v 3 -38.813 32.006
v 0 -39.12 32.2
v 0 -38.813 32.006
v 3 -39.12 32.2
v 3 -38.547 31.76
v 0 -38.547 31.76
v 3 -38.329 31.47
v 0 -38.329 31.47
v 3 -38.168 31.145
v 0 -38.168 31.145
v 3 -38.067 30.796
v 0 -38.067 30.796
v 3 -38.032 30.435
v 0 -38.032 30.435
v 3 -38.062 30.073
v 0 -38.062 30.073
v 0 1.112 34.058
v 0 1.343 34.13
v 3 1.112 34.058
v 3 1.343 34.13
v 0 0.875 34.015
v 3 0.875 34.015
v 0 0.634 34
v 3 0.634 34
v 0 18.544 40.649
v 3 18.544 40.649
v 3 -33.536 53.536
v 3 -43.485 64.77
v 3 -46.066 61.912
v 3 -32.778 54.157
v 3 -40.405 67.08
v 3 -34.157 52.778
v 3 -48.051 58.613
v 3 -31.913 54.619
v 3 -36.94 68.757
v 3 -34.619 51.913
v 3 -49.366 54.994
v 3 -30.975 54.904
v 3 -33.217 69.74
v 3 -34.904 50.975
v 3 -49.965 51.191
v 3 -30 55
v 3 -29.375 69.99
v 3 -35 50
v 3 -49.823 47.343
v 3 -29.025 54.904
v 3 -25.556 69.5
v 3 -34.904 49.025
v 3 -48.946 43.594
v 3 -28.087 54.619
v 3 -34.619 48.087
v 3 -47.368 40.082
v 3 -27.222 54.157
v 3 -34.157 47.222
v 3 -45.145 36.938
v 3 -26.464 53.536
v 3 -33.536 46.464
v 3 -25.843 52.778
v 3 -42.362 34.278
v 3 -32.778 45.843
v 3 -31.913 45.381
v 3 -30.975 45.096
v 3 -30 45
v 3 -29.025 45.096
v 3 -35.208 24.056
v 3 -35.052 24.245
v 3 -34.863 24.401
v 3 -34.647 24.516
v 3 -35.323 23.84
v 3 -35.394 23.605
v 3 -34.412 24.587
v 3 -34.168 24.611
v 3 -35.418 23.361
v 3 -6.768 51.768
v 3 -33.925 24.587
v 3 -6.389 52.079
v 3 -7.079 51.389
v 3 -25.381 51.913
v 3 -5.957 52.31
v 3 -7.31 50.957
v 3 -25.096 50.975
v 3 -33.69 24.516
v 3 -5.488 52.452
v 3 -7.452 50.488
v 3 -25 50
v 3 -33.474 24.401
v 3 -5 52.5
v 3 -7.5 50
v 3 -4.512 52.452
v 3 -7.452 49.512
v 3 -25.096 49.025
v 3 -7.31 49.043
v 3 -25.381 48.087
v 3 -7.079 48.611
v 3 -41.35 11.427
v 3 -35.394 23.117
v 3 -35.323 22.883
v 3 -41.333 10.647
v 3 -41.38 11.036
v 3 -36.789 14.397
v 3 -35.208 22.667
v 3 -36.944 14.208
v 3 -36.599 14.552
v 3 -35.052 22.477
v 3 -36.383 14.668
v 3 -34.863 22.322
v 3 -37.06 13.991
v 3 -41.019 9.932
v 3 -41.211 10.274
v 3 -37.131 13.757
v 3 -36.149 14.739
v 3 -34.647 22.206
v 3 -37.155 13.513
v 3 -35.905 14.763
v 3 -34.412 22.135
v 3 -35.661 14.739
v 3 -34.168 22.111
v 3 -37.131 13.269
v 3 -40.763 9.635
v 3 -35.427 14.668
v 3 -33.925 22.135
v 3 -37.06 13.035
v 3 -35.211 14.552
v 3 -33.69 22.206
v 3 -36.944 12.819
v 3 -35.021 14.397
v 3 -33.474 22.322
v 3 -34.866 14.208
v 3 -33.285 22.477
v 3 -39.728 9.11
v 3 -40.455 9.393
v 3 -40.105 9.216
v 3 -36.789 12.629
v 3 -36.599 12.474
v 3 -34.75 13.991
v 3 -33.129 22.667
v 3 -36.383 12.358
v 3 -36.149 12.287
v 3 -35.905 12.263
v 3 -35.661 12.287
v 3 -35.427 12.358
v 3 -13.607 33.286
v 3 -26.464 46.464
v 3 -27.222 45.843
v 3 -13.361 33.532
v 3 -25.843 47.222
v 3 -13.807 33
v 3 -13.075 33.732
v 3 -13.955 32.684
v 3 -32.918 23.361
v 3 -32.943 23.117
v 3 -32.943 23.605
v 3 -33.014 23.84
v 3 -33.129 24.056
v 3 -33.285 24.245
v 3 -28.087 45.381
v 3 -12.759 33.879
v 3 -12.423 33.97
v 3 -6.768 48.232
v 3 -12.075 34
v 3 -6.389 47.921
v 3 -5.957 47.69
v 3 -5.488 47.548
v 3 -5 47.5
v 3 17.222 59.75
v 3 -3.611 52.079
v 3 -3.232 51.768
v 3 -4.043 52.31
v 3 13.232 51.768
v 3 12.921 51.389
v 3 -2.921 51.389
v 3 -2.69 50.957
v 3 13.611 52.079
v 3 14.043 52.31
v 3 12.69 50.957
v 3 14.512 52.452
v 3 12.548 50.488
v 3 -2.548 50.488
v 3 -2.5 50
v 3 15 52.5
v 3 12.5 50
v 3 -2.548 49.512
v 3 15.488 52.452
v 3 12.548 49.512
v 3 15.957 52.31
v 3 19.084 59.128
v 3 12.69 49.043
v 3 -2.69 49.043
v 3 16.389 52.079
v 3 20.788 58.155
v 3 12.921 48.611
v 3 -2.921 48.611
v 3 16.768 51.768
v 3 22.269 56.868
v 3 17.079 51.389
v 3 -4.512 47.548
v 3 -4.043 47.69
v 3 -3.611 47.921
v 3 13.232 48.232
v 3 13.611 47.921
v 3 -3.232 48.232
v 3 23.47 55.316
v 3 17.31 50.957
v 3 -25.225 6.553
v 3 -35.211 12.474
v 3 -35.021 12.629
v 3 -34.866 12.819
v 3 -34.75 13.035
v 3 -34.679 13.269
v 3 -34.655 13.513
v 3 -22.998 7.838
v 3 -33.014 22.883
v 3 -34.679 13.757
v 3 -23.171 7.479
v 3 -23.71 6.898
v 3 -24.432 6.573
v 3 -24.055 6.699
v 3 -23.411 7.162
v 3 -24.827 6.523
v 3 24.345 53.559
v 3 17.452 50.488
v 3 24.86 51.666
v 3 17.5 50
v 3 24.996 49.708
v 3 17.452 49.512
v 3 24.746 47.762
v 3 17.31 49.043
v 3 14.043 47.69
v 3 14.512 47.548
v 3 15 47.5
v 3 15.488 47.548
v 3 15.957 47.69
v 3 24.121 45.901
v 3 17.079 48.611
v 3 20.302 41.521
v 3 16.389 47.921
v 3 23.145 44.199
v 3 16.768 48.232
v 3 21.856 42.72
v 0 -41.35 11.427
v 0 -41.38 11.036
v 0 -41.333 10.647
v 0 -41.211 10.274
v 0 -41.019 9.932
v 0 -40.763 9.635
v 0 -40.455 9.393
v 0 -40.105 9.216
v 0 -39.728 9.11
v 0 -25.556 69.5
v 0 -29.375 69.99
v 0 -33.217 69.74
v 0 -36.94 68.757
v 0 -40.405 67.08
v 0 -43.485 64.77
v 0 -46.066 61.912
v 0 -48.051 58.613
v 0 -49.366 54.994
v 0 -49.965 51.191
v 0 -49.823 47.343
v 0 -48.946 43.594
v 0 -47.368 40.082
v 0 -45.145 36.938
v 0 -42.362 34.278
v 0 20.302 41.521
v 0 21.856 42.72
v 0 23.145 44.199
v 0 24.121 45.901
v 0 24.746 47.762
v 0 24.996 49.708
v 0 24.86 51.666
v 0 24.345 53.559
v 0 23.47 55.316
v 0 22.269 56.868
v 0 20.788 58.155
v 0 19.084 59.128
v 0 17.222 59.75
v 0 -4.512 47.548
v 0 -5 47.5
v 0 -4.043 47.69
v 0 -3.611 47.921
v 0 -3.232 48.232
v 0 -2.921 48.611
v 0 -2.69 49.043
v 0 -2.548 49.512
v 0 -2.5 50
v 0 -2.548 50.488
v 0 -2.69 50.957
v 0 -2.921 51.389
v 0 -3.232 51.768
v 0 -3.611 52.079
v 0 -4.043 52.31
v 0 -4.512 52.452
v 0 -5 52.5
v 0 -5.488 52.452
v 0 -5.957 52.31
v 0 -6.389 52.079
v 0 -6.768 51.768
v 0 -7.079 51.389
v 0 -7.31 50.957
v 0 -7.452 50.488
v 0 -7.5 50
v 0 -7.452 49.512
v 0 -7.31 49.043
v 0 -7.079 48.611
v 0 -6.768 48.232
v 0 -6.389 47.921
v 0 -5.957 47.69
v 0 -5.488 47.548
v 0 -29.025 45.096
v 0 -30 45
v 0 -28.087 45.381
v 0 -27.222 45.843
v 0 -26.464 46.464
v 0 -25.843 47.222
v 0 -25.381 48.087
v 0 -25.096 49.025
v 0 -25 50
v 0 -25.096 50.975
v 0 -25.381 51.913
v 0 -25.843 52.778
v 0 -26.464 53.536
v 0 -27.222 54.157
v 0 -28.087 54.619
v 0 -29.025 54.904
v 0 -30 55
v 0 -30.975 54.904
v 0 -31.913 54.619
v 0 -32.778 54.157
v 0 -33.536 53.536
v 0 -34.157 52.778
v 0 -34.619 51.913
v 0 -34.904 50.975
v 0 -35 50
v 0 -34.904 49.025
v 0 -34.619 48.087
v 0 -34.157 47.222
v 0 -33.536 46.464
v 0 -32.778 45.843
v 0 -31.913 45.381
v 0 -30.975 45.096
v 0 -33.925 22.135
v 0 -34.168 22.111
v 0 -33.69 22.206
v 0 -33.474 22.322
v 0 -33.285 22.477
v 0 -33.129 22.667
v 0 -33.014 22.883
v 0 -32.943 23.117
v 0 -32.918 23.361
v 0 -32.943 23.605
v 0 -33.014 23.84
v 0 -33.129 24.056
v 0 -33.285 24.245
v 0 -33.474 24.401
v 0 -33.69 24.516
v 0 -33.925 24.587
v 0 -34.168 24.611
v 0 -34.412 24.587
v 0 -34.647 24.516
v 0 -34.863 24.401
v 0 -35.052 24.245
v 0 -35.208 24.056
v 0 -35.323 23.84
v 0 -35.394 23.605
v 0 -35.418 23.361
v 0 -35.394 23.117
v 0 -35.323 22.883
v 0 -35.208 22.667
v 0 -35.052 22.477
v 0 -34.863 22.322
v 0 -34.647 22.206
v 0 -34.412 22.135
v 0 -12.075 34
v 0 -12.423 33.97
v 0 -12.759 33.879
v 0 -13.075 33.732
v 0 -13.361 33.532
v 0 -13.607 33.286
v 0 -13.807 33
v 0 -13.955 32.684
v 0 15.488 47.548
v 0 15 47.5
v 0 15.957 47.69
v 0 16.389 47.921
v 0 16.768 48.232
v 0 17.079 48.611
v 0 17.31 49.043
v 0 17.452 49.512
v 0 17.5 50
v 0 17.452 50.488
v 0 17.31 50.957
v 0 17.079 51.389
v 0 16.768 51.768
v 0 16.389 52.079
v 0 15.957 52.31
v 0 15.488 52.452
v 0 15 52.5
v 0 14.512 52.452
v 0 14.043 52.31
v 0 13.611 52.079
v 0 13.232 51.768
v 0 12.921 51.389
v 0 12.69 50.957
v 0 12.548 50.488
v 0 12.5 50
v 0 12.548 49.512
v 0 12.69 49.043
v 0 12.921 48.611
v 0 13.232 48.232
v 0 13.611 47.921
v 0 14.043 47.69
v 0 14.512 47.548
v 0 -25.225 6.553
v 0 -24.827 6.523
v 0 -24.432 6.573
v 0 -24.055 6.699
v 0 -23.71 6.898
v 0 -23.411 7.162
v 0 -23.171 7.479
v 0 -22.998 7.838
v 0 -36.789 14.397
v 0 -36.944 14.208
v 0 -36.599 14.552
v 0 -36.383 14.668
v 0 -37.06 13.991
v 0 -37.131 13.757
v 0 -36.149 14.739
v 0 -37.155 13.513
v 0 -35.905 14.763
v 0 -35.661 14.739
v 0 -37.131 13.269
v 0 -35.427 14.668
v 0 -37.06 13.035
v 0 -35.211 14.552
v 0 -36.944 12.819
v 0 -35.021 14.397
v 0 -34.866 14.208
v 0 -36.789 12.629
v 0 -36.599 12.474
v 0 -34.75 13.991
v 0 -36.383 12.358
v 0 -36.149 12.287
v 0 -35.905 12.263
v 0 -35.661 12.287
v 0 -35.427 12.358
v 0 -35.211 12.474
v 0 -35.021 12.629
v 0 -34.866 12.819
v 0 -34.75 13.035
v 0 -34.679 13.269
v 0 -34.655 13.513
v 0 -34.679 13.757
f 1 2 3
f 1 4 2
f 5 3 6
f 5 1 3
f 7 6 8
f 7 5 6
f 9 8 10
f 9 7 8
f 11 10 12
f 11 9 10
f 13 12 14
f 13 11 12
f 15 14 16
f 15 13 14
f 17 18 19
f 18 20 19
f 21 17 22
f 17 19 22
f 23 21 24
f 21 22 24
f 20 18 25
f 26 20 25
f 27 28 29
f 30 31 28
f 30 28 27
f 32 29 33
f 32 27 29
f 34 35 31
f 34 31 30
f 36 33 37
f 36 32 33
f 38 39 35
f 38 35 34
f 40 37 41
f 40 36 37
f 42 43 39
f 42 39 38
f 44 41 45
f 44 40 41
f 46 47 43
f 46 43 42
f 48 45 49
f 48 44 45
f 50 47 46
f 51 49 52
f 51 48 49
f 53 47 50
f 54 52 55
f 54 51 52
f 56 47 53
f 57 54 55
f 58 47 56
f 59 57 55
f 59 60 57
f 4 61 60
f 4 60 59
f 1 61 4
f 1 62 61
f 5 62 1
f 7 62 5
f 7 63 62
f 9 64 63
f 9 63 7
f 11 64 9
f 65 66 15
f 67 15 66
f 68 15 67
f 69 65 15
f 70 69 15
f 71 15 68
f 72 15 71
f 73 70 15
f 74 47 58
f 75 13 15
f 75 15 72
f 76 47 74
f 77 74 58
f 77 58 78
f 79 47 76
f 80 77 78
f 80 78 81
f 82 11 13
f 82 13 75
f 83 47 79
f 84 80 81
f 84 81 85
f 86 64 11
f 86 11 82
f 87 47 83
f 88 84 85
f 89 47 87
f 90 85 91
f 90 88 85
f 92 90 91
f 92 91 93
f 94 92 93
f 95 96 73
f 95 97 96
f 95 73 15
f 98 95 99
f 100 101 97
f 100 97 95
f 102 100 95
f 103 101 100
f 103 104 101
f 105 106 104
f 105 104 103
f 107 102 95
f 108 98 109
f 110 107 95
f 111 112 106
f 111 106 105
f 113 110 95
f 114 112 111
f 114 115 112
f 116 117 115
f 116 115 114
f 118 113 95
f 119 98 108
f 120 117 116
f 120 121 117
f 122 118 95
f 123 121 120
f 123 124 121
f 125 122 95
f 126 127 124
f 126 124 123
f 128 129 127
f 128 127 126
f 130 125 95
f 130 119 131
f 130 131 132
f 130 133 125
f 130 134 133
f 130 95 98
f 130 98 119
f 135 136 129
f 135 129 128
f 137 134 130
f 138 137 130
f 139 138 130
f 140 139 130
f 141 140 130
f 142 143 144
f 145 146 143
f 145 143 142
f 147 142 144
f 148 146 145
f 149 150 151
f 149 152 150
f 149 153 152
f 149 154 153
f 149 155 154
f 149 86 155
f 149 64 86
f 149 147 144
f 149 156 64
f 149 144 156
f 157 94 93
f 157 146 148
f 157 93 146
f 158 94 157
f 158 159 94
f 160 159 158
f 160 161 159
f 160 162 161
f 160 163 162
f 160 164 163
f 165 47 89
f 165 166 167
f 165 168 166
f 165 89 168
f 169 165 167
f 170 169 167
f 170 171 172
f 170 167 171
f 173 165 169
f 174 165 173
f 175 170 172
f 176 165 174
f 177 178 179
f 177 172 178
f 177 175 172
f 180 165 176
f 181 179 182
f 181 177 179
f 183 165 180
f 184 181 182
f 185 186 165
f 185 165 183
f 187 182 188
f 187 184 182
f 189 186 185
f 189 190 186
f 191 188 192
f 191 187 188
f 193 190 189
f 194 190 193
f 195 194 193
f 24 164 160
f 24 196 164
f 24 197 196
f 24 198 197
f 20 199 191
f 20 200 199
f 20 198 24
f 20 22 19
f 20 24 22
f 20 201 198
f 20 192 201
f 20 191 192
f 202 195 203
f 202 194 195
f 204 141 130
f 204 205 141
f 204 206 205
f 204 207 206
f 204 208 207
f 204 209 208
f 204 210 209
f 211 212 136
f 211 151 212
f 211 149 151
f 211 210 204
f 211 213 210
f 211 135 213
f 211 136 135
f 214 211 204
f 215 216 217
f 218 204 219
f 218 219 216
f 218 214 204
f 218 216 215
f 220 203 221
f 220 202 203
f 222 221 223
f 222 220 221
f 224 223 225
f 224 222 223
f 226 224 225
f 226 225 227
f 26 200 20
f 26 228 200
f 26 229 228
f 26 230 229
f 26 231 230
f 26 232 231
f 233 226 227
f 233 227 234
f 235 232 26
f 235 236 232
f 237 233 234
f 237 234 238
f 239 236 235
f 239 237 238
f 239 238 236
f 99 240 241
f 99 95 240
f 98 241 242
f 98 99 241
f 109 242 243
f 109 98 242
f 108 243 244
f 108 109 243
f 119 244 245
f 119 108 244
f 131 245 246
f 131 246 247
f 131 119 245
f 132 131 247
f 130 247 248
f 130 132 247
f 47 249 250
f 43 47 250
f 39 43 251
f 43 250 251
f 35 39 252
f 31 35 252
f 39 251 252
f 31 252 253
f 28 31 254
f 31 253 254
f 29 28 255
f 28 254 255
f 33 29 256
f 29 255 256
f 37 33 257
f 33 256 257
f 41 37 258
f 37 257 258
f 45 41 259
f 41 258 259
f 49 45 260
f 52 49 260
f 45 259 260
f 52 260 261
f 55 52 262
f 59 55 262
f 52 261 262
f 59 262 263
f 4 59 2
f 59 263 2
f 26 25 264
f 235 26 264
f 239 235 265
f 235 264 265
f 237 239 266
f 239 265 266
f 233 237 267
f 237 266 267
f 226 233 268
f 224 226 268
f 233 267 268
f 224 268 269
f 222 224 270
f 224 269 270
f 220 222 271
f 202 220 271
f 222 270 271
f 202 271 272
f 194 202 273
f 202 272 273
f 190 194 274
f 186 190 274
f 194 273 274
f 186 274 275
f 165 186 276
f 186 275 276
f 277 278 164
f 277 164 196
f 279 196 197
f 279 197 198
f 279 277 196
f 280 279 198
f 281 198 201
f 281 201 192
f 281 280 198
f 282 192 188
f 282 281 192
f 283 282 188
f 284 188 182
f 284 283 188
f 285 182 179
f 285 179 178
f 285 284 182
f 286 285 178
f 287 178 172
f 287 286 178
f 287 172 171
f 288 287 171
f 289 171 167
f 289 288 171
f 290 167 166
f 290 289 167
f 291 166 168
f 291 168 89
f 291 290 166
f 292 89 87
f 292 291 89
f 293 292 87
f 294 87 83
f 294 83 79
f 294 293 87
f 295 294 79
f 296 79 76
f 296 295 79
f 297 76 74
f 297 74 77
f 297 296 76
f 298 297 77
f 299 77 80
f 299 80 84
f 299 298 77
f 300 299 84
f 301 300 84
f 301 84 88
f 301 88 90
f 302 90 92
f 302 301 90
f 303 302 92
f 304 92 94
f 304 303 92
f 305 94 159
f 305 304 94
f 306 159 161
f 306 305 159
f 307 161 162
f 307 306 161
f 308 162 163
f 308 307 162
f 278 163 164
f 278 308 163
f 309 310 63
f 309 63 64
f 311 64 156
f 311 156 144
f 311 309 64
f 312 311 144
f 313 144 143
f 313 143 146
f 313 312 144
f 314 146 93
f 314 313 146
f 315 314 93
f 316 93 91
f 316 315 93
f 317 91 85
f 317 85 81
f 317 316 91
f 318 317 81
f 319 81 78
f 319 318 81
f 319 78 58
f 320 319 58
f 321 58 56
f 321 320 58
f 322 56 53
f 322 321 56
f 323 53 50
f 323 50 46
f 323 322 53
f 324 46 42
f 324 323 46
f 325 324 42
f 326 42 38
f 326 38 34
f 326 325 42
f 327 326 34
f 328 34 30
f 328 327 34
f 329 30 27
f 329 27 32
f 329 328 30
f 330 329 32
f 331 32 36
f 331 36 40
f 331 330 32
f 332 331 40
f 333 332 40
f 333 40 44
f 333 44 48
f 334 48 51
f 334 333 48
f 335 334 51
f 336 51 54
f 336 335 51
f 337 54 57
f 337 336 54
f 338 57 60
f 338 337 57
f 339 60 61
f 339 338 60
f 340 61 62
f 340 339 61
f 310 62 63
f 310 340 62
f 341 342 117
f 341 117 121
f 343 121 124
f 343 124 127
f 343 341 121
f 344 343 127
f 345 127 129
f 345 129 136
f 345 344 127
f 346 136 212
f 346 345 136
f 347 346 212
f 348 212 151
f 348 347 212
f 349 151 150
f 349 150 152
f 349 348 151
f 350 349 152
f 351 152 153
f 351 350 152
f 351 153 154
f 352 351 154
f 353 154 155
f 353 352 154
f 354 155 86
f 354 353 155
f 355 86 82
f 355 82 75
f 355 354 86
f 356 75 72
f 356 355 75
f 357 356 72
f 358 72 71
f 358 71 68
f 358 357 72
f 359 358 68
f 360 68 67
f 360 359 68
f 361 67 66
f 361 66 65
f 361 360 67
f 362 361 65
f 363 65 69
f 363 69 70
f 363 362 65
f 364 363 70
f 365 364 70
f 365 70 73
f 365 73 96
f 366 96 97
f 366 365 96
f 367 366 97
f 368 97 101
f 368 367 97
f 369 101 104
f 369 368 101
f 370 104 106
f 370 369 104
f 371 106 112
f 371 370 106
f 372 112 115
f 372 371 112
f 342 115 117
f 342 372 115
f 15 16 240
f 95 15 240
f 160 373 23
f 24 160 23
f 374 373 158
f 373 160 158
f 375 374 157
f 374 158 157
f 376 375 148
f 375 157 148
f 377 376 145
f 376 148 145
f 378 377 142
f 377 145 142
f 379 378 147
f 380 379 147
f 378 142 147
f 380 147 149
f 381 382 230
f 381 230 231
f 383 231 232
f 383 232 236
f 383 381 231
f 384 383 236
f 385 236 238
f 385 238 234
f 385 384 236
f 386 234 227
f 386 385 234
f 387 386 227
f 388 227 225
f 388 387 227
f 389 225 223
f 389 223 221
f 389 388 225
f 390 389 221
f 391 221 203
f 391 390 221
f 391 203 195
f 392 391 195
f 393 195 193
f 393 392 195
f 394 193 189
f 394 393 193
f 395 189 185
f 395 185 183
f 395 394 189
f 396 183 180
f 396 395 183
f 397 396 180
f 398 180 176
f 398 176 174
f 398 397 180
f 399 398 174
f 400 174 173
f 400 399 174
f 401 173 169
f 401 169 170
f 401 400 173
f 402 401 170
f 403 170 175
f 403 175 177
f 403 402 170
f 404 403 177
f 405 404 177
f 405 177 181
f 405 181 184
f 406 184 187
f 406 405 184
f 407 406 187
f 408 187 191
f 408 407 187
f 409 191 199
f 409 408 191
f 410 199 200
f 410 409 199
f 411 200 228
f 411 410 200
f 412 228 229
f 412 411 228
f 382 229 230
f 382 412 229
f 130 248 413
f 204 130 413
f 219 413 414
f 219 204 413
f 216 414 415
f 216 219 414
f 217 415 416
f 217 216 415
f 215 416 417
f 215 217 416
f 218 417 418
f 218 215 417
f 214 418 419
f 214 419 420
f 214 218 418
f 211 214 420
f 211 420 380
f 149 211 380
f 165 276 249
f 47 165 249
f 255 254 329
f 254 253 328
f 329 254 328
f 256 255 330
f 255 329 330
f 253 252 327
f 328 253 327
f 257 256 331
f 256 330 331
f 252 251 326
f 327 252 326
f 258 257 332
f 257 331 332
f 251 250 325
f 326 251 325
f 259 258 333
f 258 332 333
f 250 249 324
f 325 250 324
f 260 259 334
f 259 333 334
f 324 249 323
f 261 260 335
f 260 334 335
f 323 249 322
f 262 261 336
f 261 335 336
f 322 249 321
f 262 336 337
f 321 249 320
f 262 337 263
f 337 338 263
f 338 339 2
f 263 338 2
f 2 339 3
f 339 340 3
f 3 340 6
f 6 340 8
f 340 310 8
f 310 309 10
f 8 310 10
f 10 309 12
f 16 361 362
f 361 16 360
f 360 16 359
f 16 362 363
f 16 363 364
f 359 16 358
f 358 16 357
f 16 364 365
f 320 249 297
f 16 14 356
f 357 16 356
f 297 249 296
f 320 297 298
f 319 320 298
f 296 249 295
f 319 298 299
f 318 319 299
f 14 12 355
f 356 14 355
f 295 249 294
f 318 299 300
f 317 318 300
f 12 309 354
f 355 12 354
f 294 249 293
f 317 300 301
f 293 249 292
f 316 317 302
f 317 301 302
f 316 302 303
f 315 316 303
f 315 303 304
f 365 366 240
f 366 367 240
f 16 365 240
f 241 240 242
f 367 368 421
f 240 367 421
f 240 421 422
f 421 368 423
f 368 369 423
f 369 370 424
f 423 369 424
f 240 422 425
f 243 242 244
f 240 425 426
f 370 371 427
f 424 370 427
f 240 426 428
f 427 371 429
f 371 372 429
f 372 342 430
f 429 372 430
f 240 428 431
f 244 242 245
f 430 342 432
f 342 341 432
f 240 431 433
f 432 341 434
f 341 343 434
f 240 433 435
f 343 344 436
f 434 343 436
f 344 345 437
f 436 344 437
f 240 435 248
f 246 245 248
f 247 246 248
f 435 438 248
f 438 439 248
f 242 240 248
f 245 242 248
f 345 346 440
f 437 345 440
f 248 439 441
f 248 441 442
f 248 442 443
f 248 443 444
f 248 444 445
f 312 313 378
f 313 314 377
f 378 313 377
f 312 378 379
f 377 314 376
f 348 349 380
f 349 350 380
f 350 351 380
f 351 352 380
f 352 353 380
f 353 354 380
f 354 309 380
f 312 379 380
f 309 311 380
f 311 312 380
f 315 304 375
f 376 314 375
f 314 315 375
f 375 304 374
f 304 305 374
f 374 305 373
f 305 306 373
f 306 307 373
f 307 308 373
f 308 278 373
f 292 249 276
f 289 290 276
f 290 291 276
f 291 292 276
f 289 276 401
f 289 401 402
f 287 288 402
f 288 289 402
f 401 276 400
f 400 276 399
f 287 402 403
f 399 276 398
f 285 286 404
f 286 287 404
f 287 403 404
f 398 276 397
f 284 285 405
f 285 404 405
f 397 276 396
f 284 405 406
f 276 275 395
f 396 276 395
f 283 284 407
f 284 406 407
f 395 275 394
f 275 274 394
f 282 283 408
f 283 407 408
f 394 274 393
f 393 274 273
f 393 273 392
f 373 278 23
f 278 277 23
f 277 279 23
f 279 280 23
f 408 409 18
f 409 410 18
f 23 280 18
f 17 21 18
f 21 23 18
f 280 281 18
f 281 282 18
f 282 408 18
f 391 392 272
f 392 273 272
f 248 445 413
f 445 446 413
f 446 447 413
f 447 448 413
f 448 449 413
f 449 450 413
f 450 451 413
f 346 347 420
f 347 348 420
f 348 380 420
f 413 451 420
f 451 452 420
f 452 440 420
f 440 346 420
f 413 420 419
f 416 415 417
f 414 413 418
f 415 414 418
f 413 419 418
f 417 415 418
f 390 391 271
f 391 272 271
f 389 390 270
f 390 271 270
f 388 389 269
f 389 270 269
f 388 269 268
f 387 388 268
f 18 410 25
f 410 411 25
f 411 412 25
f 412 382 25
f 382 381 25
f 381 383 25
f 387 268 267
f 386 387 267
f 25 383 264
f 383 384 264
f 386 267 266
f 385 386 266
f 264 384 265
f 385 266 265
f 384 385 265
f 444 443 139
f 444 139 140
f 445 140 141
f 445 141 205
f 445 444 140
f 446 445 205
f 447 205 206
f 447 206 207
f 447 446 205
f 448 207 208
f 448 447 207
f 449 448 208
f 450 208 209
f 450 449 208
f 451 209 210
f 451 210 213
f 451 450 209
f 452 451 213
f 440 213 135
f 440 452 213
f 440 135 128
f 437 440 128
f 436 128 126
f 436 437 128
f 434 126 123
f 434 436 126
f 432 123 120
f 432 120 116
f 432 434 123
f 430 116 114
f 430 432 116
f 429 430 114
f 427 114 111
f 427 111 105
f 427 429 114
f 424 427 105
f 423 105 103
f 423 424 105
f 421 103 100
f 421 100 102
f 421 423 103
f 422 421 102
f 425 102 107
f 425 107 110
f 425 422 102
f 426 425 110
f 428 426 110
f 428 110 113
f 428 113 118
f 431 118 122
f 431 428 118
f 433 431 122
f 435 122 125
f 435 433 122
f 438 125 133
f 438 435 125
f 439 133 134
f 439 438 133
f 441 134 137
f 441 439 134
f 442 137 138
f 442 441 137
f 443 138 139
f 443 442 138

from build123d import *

# Parameters (mm, degrees)
SKETCH1_R           = 5
SKETCH1_R_2         = 2.5
SKETCH1_R_3         = 1.25
BOSS_EXTRUDE1_DEPTH = 3
FILLET1_R           = 2


with BuildPart() as part:
    # Sketch1 → Boss-Extrude1 (new body)
    with BuildSketch(Plane(origin=(0, 0, 0), x_dir=(0, 0, -1), z_dir=(1, 0, 0))):
        with BuildLine():
            Line((-59.74996043, 17.222222222), (-69.499920861, -25.555555556))
            ThreePointArc((-69.499920861, -25.555555556), (-56.144118615, -49.032861226), (-31.582037919, -37.796067776))
            Line((-31.582037919, -37.796067776), (-9.457329759, -41.697250765))
            Line((-9.457329759, -41.697250765), (-6.26133088, -23.571840424))
            Line((-6.26133088, -23.571840424), (-34, -13.475790526))
            Line((-34, -13.475790526), (-34, 1))
            Line((-34, 1), (-40.649042421, 18.543951518))
            ThreePointArc((-40.649042421, 18.543951518), (-50.690320869, 24.9761444), (-59.74996043, 17.222222222))
        make_face()
        with Locations((-50, -30)):
            Circle(SKETCH1_R, mode=Mode.SUBTRACT)
        with Locations((-50, 15)):
            Circle(SKETCH1_R_2, mode=Mode.SUBTRACT)
        with Locations((-50, -5)):
            Circle(SKETCH1_R_2, mode=Mode.SUBTRACT)
        with Locations((-23.361205166, -34.168489335)):
            Circle(SKETCH1_R_3, mode=Mode.SUBTRACT)
        with Locations((-13.513127636, -35.904971111)):
            Circle(SKETCH1_R_3, mode=Mode.SUBTRACT)
    extrude(amount=BOSS_EXTRUDE1_DEPTH)

    # Fillet1
    fillet1_edges = [part.edges().sort_by_distance(p)[0] for p in [
        (1.5, 1, 34),
        (1.5, -13.475790526, 34),
        (1.5, -23.571840424, 6.26133088),
        (1.5, -41.697250765, 9.457329759),
        (1.5, -37.796067776, 31.582037919),
    ]]
    fillet(fillet1_edges, radius=FILLET1_R)


solid = part.part
